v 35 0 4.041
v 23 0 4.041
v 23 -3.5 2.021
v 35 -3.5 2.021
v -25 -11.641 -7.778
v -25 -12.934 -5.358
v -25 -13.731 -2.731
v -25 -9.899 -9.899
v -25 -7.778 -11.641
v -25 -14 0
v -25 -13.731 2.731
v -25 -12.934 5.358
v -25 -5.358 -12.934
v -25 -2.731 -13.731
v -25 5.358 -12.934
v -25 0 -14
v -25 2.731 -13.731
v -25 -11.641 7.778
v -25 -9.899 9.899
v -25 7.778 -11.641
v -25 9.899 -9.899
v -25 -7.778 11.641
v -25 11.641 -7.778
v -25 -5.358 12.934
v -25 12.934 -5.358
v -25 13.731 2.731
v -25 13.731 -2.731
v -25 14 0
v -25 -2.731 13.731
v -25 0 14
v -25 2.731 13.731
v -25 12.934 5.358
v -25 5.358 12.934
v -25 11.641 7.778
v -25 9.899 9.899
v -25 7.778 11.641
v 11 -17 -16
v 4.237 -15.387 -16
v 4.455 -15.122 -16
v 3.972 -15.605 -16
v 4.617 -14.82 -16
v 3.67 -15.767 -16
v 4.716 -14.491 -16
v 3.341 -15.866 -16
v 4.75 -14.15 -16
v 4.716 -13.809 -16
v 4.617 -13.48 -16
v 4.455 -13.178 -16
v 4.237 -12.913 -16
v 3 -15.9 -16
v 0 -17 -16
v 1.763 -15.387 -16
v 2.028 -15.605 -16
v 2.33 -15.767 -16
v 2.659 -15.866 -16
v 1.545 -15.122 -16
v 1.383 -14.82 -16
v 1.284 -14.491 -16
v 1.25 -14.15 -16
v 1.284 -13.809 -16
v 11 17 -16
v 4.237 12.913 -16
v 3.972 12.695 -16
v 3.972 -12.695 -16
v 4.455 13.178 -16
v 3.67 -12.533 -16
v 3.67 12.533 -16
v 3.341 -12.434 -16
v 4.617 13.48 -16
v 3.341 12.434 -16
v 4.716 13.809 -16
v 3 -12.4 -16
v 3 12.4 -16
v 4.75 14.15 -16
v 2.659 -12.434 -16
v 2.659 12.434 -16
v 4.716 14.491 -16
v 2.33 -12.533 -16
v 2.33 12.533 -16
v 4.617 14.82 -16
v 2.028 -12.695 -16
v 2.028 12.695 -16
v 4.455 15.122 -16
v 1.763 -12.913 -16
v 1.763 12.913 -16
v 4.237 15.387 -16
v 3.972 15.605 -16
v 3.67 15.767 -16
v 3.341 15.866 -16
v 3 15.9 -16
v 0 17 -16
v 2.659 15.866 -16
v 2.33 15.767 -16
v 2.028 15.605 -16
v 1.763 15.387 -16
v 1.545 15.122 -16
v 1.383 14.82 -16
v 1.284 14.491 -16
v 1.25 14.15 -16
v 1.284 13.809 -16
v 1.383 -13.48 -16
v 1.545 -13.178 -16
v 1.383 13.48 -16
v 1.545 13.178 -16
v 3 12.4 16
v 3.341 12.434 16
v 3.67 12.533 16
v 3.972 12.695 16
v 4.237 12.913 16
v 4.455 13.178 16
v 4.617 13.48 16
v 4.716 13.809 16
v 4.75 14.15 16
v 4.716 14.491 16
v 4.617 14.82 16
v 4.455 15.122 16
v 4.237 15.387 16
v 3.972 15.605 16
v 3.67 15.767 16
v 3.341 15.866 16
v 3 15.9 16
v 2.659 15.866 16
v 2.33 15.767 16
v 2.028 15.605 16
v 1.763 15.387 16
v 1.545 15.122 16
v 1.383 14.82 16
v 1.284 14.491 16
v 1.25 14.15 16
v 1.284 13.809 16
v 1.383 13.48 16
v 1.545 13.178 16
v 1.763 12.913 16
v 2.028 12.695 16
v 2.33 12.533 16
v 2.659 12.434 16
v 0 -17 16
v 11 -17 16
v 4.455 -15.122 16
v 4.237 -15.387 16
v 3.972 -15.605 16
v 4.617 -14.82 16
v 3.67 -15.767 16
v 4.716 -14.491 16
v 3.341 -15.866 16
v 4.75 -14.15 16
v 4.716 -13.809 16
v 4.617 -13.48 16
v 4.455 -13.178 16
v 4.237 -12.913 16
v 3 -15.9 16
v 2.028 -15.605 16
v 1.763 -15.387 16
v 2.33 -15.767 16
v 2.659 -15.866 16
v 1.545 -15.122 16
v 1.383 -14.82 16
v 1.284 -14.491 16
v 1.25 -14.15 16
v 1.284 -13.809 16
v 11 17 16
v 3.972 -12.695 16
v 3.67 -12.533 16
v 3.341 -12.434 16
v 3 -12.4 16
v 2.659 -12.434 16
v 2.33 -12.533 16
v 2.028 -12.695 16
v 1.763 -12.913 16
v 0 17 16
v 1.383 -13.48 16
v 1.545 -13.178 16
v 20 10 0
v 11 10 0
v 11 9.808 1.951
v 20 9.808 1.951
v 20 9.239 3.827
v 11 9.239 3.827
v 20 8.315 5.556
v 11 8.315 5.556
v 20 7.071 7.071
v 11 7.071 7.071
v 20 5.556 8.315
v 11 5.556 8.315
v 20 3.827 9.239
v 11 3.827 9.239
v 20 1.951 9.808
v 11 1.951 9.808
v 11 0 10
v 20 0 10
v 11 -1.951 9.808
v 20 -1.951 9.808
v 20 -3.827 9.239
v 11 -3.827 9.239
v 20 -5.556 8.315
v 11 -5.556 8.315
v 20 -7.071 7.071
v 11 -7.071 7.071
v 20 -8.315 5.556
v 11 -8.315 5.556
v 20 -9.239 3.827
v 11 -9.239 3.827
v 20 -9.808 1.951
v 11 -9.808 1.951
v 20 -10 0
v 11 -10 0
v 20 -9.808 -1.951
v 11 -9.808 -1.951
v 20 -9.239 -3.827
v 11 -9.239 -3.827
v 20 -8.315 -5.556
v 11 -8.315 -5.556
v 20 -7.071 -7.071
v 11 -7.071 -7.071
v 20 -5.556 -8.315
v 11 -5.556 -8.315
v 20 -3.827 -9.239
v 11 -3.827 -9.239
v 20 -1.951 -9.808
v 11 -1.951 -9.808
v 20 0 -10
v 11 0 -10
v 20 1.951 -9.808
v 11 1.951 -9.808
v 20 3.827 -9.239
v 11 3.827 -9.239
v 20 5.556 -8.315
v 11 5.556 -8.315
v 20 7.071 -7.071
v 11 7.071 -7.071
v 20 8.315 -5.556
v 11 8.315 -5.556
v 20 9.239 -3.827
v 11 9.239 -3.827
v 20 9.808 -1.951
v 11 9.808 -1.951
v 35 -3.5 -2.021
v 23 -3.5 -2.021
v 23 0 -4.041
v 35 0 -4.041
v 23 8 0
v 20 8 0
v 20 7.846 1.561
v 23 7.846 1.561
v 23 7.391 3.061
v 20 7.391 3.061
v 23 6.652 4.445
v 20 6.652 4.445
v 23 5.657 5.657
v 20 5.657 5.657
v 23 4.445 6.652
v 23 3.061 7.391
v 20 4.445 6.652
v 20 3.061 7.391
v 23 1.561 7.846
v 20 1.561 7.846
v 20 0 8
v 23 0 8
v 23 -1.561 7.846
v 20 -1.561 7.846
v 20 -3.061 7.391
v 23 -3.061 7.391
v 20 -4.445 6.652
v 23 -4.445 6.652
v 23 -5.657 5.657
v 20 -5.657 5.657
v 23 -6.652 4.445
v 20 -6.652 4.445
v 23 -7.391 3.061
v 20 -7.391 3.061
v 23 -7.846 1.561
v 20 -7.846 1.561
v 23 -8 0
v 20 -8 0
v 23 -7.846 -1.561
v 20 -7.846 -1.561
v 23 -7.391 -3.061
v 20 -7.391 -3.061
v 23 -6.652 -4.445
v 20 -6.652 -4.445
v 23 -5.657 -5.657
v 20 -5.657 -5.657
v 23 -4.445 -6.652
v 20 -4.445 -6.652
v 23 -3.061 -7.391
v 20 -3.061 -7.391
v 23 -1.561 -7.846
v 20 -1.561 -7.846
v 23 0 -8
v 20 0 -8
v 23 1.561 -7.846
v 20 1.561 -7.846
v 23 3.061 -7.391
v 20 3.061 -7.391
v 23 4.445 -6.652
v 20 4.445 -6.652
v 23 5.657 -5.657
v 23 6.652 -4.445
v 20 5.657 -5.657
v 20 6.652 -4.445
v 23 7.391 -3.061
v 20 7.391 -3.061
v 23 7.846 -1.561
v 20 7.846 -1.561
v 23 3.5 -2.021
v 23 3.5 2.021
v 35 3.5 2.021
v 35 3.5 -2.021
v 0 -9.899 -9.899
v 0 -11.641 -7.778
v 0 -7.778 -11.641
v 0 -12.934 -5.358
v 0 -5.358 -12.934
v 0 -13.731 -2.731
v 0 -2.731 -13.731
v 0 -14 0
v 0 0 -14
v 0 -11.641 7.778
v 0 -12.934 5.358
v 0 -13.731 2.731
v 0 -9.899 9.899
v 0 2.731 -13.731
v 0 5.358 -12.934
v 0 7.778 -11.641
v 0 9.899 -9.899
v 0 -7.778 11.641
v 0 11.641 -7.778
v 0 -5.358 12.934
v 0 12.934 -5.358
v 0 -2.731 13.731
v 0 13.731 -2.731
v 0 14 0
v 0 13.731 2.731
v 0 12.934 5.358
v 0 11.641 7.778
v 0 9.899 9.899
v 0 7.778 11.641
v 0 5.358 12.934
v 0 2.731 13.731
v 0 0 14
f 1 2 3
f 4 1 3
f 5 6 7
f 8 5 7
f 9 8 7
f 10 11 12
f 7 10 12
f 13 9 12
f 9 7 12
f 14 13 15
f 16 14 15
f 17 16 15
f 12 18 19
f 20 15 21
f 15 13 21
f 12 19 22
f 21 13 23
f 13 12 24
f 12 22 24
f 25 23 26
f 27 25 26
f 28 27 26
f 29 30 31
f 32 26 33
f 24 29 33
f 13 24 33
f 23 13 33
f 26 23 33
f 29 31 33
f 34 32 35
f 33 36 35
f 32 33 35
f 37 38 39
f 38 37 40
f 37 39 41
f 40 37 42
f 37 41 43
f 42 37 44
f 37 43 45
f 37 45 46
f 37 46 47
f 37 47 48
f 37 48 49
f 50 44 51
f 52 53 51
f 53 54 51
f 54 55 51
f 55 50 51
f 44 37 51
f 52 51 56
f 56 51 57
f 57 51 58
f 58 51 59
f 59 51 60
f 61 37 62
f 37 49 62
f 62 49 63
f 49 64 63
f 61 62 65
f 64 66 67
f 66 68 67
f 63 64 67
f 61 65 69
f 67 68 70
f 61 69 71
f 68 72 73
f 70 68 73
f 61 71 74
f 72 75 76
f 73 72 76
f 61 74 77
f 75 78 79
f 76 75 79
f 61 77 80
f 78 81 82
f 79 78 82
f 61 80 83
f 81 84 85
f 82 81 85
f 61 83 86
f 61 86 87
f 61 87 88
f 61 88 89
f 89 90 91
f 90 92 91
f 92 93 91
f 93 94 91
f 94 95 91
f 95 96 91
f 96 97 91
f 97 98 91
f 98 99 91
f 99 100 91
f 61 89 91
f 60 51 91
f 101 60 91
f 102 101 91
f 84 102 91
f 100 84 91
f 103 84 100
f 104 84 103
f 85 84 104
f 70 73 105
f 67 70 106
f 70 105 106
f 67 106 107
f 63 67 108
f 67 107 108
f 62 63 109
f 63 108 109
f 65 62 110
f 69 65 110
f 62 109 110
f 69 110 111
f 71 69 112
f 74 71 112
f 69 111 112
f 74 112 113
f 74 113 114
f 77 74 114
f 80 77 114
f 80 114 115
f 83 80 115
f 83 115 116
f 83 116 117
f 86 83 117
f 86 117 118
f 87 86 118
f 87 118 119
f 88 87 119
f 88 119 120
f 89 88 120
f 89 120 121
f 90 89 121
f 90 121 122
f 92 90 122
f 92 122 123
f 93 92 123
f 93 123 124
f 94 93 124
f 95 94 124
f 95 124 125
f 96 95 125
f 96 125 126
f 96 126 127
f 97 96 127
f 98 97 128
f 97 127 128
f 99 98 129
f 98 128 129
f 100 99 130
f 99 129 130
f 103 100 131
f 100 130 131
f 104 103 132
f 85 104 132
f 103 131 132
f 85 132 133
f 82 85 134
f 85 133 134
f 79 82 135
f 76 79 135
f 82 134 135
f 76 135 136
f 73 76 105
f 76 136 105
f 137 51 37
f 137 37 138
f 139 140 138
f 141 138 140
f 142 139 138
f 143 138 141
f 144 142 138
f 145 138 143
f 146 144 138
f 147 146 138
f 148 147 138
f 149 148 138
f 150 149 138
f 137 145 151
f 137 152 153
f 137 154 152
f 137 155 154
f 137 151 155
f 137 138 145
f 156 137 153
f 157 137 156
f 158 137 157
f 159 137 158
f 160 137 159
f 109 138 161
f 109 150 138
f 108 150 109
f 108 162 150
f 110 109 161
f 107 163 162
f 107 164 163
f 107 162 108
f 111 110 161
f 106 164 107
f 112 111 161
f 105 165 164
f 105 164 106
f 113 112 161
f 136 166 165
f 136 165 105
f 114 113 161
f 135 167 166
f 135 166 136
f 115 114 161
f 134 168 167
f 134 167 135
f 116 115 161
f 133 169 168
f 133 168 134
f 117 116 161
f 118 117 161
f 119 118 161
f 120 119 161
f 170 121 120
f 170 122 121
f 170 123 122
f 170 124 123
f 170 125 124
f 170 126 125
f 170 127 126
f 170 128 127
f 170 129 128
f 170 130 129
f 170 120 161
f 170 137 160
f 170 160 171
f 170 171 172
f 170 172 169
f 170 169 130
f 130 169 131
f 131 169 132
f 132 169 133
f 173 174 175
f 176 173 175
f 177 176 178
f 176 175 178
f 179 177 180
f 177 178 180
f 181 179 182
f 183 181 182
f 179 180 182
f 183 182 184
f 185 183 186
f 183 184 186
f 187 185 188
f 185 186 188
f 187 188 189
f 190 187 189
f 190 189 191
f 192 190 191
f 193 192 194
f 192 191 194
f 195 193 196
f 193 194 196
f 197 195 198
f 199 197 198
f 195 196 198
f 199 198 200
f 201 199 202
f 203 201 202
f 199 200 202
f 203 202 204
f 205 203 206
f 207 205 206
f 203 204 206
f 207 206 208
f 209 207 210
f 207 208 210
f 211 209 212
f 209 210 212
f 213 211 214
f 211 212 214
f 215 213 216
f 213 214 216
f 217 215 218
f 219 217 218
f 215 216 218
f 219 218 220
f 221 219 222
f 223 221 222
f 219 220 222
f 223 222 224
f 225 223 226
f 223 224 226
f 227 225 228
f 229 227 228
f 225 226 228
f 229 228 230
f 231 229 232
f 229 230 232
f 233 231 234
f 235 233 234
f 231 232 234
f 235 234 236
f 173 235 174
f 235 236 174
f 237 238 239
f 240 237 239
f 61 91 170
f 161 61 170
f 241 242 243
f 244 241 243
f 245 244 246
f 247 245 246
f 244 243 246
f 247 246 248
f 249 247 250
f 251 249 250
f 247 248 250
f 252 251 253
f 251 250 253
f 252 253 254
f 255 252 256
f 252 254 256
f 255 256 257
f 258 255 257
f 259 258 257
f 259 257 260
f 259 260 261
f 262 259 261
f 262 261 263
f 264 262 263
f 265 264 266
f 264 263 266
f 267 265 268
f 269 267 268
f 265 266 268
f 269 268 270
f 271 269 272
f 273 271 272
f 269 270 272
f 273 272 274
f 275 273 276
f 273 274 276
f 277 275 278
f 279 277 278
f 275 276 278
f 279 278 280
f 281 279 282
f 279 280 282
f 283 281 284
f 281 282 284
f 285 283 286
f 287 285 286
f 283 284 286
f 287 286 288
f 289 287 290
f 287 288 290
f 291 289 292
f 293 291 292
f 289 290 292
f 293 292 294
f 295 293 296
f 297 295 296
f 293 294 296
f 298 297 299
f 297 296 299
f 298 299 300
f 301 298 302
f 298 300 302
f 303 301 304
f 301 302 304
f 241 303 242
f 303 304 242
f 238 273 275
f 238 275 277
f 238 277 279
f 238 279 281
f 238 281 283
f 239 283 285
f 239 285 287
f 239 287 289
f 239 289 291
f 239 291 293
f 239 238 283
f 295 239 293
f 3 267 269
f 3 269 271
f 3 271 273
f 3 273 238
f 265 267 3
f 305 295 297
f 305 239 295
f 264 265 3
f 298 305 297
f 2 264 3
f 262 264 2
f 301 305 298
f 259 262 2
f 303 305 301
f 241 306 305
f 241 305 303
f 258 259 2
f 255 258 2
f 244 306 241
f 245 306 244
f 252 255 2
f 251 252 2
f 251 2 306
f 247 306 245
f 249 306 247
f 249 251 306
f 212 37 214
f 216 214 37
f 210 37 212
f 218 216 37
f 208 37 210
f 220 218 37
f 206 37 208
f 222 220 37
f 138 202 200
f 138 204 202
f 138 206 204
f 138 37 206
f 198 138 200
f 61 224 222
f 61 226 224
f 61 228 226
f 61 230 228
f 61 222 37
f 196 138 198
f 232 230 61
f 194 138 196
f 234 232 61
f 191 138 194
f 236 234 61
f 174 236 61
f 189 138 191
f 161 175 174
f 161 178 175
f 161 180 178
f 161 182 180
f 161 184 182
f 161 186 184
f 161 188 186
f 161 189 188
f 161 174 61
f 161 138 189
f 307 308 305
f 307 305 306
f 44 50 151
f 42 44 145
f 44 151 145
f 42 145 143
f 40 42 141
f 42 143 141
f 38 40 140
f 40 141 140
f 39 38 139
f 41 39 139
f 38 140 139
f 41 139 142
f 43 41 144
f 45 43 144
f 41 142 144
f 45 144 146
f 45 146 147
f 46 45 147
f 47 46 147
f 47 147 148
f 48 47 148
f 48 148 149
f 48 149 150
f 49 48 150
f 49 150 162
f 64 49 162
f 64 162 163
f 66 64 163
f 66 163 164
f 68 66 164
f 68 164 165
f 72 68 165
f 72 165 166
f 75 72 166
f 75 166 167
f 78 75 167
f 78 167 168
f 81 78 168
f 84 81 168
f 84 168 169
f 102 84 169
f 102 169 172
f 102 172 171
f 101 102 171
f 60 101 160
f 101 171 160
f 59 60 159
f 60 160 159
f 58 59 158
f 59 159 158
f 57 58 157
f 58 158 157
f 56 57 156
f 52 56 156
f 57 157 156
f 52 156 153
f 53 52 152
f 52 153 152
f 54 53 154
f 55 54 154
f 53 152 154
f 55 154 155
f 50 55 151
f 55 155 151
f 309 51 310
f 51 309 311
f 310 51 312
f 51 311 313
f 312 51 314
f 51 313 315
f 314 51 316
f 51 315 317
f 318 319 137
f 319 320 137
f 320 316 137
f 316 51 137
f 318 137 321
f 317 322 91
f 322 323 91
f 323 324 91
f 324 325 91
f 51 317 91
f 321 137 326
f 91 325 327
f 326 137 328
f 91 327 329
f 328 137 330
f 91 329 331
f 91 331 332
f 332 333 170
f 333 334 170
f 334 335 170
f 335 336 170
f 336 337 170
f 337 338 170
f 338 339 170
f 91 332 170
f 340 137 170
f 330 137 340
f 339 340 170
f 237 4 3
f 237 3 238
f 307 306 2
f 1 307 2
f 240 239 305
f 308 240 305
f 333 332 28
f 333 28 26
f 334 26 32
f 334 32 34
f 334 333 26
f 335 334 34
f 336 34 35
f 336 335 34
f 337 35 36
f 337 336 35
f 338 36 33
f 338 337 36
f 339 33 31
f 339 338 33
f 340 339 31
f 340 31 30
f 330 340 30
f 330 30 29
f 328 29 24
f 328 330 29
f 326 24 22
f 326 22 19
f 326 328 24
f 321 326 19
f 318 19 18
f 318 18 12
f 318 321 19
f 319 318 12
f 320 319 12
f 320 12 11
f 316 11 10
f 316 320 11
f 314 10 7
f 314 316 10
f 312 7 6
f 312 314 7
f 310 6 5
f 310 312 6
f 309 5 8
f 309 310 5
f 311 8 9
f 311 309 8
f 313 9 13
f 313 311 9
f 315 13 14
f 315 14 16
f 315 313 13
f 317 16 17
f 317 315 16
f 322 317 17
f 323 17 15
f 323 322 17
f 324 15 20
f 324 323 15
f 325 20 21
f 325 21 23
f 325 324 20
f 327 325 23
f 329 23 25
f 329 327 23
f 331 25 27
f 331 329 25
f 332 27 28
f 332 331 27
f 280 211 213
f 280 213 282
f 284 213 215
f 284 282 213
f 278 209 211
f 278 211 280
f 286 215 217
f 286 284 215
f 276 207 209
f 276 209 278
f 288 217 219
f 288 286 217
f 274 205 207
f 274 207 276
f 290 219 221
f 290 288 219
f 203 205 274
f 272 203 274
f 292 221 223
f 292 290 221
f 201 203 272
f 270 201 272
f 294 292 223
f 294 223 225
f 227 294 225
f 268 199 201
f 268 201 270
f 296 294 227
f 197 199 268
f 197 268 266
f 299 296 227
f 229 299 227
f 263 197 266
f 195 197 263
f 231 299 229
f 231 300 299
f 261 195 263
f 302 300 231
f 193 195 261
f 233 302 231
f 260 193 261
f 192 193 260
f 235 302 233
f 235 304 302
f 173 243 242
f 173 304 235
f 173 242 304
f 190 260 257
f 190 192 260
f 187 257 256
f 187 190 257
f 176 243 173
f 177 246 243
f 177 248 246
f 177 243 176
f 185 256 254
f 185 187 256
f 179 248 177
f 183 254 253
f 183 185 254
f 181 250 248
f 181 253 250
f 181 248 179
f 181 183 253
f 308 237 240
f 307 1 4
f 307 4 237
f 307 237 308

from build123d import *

# Parameters (mm, degrees)
SKETCH_R     = 14
PAD_DEPTH    = 25
SKETCH001_W  = 34
SKETCH001_H  = 32
PAD001_DEPTH = 11
SKETCH002_R  = 10
PAD002_DEPTH = 9
SKETCH003_R  = 8
PAD003_DEPTH = 3
PAD004_DEPTH = 12
SKETCH005_R  = 1.75
POCKET_DEPTH = 100


with BuildPart() as part:
    # Sketch → Pad (new body)
    with BuildSketch(Plane.YZ):
        Circle(SKETCH_R)
    extrude(amount=-PAD_DEPTH)

    # Sketch001 (on Face2 of Pad) → Pad001 (join)
    with BuildSketch(Plane.YZ):
        Rectangle(SKETCH001_W, SKETCH001_H)
    extrude(amount=PAD001_DEPTH)

    # Sketch002 (on Face5 of Pad001) → Pad002 (join)
    with BuildSketch(Plane.YZ.offset(11)):
        Circle(SKETCH002_R)
    extrude(amount=PAD002_DEPTH)

    # Sketch003 (on Face10 of Pad002) → Pad003 (join)
    with BuildSketch(Plane.YZ.offset(20)):
        Circle(SKETCH003_R)
    extrude(amount=PAD003_DEPTH)

    # Sketch004 (on Face12 of Pad003) → Pad004 (join)
    with BuildSketch(Plane.YZ.offset(23)):
        Polygon((0, 4.041452), (-3.5, 2.020726), (-3.5, -2.020726), (0, -4.041452), (3.5, -2.020726), (3.5, 2.020726), align=None)
    extrude(amount=PAD004_DEPTH)

    # Sketch005 (on Face1 of Pad004) → Pocket (cut)
    with BuildSketch(Plane(origin=(0, 0, 16), x_dir=(0, -1, 0), z_dir=(0, 0, 1))):
        with Locations((-14.15, 3)):
            Circle(SKETCH005_R)
        with Locations((14.15, 3)):
            Circle(SKETCH005_R)
    extrude(amount=-POCKET_DEPTH, mode=Mode.SUBTRACT)


solid = part.part
